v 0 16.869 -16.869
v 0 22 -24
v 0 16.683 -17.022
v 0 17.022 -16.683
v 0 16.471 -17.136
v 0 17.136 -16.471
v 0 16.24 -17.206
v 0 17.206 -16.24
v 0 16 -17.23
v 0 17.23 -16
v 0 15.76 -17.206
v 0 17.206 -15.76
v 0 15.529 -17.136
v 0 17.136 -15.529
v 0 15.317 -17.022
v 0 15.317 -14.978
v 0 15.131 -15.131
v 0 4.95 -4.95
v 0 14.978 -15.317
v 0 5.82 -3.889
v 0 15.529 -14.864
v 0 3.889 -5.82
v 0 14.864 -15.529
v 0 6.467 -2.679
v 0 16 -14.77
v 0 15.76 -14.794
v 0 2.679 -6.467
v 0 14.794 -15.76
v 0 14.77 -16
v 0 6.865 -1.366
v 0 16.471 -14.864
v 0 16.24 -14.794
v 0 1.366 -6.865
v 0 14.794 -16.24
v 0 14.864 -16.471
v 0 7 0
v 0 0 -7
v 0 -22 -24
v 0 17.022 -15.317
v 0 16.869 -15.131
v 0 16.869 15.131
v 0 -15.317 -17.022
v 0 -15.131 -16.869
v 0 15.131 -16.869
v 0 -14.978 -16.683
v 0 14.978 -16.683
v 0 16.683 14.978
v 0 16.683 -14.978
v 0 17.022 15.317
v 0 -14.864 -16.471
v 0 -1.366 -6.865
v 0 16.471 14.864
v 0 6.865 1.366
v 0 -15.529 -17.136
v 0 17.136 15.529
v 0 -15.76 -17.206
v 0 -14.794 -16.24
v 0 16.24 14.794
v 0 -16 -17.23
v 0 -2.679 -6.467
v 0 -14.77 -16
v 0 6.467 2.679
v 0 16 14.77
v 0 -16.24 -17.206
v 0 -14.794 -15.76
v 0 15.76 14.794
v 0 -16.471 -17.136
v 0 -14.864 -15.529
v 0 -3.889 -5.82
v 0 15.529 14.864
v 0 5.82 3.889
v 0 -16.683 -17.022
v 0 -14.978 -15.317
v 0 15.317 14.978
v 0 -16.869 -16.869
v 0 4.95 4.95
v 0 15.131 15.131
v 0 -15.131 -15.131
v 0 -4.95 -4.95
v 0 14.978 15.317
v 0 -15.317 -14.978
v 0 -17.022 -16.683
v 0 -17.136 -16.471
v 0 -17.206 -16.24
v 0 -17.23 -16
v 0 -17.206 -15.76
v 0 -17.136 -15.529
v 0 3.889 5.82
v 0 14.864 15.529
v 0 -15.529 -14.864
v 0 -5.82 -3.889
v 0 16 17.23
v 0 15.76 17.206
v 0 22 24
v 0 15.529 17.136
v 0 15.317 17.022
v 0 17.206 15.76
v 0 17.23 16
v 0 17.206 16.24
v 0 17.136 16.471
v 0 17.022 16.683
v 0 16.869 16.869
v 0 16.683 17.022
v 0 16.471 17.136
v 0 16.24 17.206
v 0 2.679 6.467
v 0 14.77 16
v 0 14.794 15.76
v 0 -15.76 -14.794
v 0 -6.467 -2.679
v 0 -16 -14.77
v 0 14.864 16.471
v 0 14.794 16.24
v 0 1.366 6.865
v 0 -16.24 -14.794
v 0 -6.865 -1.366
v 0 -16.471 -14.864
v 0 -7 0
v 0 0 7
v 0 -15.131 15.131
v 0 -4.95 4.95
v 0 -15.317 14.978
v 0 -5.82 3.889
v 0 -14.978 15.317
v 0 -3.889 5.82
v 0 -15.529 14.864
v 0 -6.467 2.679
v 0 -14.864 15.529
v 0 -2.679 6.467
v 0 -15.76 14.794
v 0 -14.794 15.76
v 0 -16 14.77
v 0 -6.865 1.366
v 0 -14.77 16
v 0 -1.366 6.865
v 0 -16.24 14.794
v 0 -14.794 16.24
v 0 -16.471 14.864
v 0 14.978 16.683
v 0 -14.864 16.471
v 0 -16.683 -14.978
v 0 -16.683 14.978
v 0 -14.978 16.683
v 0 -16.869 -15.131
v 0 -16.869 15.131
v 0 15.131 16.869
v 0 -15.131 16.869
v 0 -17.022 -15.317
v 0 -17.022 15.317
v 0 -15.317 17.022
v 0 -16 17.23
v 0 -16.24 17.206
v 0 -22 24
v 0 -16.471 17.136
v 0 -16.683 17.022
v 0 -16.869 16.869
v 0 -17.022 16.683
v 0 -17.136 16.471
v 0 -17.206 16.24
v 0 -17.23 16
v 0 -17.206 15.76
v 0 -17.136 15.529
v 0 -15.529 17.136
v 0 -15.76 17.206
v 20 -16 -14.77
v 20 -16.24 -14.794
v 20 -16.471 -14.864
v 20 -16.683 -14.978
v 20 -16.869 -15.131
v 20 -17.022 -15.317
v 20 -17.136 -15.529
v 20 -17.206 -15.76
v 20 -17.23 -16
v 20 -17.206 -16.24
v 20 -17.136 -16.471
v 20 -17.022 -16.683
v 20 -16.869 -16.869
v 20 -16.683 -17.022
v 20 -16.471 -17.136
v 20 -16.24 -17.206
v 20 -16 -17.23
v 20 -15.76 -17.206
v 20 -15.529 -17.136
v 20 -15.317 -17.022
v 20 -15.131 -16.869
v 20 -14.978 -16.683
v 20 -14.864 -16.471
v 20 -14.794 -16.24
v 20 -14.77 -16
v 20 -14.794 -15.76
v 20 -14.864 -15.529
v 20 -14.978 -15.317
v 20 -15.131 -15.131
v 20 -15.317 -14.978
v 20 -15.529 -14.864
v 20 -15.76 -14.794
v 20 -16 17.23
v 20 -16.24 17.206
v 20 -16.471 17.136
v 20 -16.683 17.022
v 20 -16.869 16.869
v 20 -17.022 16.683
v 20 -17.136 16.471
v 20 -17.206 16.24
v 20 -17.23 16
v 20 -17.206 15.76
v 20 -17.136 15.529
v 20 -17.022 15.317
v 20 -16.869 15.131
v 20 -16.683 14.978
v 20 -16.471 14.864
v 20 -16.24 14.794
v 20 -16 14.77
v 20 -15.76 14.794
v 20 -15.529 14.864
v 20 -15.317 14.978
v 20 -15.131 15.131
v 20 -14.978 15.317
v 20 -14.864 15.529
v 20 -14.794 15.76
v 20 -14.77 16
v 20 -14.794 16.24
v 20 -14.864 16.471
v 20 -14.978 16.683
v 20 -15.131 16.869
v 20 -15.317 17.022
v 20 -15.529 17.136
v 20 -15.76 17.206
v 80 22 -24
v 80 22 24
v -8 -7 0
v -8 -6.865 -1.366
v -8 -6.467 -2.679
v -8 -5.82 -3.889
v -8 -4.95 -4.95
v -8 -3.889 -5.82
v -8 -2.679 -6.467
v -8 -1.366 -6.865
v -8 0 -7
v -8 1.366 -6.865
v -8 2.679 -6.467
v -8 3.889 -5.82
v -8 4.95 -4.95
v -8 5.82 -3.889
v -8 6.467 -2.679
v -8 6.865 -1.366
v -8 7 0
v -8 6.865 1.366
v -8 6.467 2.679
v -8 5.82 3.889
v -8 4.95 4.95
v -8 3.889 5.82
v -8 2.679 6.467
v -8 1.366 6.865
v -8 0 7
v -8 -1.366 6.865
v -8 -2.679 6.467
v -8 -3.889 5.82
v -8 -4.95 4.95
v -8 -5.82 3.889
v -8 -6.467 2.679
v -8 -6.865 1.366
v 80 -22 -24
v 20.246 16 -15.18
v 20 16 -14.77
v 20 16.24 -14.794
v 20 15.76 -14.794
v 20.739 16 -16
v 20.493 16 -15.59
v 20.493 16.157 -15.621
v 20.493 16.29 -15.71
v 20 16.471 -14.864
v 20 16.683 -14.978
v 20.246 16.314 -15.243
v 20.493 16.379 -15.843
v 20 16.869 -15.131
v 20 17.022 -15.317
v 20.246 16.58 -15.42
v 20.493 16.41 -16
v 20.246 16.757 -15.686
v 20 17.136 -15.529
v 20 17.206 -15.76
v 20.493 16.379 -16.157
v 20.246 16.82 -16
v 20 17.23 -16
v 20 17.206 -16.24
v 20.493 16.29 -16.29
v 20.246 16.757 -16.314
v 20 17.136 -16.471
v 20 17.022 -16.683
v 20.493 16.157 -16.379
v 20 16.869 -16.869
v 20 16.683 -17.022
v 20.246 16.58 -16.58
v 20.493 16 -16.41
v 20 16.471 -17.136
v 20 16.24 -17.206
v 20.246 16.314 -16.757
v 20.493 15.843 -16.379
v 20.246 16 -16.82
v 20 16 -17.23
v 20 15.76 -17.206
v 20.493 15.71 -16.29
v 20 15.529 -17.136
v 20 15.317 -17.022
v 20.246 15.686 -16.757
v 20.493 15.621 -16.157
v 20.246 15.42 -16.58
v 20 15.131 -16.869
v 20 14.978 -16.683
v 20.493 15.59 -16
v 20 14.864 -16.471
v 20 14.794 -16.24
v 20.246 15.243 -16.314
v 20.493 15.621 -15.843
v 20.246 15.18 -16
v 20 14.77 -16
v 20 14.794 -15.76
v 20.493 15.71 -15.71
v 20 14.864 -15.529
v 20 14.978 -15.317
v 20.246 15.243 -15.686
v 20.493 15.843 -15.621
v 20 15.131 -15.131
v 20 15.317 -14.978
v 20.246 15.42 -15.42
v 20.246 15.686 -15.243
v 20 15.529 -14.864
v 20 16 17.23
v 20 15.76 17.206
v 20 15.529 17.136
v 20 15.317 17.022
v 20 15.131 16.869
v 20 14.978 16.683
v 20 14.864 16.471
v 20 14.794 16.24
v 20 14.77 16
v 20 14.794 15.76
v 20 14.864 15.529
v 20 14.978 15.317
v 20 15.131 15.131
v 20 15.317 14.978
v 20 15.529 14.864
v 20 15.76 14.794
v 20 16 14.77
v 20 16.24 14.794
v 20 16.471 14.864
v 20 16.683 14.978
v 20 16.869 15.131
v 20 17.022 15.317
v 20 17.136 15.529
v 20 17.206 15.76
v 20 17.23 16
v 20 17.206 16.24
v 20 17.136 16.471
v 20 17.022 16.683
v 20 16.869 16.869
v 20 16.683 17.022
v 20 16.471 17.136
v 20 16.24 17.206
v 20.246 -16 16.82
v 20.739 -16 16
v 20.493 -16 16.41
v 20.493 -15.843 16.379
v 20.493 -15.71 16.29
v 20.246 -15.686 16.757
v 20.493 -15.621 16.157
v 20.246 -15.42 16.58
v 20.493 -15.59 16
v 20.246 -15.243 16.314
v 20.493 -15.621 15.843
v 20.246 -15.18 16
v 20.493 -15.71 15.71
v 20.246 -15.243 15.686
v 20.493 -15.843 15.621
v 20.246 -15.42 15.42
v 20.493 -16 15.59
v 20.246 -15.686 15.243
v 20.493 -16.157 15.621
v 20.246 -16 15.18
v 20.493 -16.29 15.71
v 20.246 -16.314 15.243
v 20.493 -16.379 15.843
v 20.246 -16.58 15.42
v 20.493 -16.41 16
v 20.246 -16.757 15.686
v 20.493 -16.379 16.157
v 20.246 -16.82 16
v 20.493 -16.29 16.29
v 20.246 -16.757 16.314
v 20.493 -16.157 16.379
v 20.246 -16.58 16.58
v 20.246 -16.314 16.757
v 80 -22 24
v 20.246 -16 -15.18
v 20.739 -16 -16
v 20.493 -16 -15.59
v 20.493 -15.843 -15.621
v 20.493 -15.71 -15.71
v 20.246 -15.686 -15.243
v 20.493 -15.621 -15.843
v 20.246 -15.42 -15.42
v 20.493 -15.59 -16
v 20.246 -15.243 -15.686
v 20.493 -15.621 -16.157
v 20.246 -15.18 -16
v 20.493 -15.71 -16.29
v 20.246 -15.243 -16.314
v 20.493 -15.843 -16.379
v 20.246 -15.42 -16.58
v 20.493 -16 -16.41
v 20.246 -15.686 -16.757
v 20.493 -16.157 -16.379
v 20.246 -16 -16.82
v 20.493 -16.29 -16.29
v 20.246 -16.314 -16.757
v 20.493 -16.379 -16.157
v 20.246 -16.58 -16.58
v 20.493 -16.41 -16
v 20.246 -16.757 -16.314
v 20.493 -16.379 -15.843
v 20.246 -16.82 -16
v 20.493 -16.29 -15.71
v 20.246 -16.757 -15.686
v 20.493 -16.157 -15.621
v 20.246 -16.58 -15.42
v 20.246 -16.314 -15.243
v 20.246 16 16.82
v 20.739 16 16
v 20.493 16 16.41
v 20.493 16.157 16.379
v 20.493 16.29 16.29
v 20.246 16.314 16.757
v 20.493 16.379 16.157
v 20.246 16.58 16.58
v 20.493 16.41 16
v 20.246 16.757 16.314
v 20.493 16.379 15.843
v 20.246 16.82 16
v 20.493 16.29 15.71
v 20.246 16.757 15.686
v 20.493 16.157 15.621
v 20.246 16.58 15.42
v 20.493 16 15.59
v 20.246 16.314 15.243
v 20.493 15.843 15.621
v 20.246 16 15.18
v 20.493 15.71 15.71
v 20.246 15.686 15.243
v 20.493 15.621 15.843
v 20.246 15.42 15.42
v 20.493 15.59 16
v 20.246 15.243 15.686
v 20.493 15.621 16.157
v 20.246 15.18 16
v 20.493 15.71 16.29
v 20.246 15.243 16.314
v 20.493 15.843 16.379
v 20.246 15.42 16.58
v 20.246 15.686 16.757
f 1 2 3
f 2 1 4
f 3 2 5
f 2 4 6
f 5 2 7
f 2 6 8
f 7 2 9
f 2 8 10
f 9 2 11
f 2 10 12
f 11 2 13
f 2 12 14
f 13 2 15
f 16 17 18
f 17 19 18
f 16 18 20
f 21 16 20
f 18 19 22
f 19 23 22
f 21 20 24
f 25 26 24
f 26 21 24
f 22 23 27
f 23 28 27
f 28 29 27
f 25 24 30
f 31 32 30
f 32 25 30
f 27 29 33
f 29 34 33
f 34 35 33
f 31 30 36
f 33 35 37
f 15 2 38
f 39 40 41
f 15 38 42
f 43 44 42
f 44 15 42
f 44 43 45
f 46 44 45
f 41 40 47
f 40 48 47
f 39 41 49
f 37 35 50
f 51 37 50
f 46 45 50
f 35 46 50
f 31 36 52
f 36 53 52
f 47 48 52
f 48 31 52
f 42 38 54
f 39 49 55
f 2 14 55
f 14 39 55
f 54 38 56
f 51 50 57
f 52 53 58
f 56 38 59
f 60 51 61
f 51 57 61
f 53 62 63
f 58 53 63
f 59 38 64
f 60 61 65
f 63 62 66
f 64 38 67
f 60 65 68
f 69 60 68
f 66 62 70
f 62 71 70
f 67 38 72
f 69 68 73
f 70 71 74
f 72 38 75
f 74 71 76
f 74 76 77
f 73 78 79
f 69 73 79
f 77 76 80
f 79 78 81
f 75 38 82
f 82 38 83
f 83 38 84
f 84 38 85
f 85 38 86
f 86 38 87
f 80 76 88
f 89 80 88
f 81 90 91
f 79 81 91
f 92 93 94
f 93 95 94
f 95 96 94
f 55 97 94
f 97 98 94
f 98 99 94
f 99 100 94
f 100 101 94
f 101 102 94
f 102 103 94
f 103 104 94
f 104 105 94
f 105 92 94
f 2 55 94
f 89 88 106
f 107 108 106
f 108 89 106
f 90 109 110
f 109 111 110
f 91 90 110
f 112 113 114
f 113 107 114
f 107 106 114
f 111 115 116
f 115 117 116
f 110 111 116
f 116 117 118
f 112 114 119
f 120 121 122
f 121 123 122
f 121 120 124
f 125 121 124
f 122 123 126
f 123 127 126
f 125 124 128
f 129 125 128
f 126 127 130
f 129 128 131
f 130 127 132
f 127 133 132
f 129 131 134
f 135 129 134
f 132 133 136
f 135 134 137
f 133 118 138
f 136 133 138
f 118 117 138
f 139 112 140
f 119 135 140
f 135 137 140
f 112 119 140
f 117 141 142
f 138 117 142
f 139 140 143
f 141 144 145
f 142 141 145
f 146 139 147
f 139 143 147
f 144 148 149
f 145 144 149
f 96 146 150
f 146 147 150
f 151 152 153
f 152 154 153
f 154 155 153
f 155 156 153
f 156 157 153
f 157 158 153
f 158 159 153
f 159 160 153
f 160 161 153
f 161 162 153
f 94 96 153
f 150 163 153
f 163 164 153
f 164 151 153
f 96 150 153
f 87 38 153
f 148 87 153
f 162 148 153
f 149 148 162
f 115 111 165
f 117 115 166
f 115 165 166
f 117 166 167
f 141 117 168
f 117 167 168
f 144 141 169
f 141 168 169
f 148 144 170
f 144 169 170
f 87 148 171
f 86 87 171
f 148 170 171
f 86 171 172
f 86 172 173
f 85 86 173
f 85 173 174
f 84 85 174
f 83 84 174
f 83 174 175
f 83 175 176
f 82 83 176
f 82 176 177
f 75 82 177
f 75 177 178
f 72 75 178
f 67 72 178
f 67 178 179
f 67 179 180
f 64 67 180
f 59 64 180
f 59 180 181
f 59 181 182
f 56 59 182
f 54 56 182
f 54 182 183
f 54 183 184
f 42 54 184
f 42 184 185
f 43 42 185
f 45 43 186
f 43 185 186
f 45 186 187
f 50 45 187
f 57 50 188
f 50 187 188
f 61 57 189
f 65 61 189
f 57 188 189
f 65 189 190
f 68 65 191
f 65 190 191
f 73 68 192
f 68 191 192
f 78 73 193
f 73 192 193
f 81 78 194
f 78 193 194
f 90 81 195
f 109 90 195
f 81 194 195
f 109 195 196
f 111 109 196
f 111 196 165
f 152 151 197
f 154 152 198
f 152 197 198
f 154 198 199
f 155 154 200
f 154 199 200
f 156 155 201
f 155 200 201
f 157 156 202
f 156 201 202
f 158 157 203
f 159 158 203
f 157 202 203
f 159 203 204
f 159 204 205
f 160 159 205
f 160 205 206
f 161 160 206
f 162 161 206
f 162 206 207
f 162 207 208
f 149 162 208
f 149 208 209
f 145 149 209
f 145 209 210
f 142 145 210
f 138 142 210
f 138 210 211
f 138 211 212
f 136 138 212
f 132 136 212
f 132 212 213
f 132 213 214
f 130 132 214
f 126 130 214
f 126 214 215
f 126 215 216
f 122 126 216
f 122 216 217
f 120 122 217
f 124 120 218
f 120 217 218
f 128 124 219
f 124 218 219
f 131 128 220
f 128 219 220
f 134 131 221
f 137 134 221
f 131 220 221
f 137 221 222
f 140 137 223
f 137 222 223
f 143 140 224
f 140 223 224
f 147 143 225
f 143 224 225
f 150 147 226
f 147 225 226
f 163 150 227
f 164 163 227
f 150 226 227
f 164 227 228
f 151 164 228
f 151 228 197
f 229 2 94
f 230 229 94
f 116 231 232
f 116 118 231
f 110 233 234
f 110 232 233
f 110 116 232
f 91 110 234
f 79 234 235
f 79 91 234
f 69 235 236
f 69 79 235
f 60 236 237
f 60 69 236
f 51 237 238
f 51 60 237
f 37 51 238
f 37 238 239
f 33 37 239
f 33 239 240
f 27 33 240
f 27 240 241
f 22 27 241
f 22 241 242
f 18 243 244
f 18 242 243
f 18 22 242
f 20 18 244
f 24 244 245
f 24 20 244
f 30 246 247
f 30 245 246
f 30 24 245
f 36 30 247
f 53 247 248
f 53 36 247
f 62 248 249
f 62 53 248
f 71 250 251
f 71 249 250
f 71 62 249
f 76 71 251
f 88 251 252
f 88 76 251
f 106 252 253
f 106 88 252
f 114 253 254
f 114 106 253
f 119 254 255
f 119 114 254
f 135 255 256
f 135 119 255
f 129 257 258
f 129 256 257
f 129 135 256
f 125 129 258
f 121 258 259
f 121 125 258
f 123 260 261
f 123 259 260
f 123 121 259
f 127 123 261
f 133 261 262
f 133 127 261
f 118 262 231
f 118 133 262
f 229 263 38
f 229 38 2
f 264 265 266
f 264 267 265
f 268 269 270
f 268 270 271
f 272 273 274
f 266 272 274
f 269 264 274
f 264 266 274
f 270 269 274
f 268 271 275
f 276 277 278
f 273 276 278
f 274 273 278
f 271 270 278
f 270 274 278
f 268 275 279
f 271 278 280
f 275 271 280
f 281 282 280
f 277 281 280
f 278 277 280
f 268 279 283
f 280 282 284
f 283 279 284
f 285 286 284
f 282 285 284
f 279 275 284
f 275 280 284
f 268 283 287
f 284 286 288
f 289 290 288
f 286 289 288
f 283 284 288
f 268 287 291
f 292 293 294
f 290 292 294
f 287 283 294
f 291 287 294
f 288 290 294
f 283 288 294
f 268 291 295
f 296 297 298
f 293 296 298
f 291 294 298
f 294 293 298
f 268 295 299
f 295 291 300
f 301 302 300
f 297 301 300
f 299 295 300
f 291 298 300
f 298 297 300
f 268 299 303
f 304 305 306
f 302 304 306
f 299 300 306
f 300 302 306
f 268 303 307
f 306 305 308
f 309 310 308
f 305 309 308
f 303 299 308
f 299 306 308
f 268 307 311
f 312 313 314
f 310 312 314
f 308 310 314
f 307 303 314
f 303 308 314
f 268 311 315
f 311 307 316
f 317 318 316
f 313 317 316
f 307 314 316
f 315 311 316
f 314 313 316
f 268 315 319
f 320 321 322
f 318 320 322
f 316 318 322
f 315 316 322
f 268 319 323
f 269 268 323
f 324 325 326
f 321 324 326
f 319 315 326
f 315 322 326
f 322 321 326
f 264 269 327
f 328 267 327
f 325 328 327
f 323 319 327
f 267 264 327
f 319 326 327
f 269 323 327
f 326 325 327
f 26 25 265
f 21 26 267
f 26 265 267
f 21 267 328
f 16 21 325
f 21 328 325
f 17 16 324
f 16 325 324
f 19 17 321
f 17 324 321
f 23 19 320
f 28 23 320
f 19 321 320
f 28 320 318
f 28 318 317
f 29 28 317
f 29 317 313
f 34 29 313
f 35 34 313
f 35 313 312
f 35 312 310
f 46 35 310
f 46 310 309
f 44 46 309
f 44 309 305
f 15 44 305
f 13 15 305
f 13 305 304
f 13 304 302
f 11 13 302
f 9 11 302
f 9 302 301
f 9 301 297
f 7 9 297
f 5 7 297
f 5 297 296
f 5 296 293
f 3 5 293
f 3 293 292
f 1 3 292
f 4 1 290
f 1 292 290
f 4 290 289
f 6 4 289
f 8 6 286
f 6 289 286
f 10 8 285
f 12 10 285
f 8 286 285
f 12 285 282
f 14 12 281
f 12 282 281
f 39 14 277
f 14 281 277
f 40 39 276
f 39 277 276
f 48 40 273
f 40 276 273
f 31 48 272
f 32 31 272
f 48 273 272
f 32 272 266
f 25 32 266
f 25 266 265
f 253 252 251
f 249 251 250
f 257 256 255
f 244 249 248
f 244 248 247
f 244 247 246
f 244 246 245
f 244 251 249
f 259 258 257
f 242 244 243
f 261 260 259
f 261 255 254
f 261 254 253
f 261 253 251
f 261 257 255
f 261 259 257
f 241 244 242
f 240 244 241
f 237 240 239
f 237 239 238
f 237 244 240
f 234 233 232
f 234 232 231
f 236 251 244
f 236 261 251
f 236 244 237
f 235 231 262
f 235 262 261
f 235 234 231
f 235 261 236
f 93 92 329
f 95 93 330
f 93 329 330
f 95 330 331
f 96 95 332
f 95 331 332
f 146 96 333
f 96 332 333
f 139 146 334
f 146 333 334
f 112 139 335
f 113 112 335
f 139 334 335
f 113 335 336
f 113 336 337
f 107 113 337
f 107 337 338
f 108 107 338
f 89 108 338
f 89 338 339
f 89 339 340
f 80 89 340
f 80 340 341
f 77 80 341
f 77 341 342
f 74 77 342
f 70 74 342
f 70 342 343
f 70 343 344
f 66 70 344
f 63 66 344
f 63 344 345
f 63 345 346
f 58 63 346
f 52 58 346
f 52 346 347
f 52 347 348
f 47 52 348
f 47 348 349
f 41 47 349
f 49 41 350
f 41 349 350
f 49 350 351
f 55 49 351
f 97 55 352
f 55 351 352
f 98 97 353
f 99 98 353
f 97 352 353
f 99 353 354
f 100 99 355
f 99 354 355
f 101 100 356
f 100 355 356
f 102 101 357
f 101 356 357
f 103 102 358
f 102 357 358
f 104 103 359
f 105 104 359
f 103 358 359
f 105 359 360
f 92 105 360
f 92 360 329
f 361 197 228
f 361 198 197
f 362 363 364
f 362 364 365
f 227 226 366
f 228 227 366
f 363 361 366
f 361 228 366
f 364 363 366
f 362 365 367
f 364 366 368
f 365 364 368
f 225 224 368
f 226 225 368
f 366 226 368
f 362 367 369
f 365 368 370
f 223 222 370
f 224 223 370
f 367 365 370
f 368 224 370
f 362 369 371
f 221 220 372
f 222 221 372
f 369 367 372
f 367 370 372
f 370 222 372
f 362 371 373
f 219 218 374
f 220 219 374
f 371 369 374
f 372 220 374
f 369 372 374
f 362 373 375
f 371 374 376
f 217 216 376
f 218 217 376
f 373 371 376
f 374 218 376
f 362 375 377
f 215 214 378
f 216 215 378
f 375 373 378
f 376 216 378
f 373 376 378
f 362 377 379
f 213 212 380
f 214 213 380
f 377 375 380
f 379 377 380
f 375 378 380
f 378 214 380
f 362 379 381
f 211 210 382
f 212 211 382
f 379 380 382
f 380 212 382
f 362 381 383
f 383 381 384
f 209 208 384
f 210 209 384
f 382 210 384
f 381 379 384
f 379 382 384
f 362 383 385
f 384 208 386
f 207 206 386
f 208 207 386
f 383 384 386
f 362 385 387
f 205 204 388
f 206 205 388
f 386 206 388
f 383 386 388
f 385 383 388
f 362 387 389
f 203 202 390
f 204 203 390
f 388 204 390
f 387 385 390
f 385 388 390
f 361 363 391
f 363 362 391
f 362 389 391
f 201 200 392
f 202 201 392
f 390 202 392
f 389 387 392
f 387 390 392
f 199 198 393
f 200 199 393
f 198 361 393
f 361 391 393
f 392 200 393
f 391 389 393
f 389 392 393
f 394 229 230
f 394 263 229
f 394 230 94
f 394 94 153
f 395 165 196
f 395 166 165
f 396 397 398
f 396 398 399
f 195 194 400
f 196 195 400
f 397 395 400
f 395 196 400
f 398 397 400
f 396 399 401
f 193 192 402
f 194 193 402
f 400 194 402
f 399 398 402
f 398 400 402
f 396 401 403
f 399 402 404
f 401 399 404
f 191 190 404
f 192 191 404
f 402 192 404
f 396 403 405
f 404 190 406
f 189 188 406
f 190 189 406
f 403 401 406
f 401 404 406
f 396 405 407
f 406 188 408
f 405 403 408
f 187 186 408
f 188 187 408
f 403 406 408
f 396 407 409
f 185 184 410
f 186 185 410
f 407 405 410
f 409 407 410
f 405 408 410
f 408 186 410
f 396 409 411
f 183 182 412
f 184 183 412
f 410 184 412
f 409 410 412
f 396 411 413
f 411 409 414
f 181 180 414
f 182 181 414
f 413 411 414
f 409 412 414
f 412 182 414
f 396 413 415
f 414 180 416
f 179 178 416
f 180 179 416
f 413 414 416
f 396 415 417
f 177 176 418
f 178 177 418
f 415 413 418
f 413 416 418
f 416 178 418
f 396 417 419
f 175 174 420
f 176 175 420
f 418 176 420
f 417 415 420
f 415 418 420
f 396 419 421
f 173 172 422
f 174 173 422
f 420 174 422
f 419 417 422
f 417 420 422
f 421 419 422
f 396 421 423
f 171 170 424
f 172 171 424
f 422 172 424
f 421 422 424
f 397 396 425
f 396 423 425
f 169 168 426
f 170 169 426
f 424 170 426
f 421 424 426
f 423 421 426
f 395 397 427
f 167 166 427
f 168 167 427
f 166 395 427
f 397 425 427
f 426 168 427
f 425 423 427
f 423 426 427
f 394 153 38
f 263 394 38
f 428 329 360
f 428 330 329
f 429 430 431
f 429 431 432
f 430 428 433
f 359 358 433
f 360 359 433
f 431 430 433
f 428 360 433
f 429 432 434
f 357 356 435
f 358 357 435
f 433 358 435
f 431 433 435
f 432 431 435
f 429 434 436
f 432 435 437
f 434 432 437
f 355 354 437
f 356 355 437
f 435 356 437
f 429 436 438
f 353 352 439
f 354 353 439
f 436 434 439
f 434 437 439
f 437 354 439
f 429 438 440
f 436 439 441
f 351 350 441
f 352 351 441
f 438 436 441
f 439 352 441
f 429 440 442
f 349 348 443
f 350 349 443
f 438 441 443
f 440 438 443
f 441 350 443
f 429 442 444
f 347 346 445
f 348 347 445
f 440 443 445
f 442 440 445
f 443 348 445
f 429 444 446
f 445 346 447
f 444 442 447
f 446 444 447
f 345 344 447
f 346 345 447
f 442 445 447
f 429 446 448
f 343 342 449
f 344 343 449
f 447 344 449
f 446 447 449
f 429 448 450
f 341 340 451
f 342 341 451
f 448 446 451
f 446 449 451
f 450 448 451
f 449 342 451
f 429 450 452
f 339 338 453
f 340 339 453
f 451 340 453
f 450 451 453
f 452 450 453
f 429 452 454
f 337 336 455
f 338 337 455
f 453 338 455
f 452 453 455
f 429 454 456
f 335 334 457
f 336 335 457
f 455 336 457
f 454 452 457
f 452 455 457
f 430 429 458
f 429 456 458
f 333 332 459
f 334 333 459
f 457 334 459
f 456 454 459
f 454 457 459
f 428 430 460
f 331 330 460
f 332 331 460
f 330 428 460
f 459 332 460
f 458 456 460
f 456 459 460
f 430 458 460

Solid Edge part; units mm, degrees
sketch "Sketch1" plane through (0, 0, 0) normal (1, 0, 0) x (0, 1, 0)
  line L0 (22, 24) -> (-22, 24)
  line L1 (-22, 24) -> (-22, -24)
  line L2 (-22, -24) -> (22, -24)
  line L3 (22, -24) -> (22, 24)
extrude "Extrusionsausprägung_20" add sketch "Sketch1" along normal blind 80
sketch "Sketch2" plane through (0, 0, 0) normal (-1, 0, 0) x (0, -1, 0)
  circle A0 centre (0, 0) radius 7
extrude "Extrusionsausprägung_22" add sketch "Sketch2" along normal blind 8
hole "Bohrung_4" at (0, 16, 16) direction (1, 0, 0) diameter 2.459 depth 20 tip angle 118 thread major 3 thread length 15
hole "Hole1" at (0, -16, 16) direction (1, 0, 0) diameter 2.459 depth 20 tip angle 118 thread major 3 thread length 15
hole "Hole2" at (0, -16, -16) direction (1, 0, 0) diameter 2.459 depth 20 tip angle 118 thread major 3 thread length 15
hole "Hole3" at (0, 16, -16) direction (1, 0, 0) diameter 2.459 depth 20 tip angle 118 thread major 3 thread length 15
